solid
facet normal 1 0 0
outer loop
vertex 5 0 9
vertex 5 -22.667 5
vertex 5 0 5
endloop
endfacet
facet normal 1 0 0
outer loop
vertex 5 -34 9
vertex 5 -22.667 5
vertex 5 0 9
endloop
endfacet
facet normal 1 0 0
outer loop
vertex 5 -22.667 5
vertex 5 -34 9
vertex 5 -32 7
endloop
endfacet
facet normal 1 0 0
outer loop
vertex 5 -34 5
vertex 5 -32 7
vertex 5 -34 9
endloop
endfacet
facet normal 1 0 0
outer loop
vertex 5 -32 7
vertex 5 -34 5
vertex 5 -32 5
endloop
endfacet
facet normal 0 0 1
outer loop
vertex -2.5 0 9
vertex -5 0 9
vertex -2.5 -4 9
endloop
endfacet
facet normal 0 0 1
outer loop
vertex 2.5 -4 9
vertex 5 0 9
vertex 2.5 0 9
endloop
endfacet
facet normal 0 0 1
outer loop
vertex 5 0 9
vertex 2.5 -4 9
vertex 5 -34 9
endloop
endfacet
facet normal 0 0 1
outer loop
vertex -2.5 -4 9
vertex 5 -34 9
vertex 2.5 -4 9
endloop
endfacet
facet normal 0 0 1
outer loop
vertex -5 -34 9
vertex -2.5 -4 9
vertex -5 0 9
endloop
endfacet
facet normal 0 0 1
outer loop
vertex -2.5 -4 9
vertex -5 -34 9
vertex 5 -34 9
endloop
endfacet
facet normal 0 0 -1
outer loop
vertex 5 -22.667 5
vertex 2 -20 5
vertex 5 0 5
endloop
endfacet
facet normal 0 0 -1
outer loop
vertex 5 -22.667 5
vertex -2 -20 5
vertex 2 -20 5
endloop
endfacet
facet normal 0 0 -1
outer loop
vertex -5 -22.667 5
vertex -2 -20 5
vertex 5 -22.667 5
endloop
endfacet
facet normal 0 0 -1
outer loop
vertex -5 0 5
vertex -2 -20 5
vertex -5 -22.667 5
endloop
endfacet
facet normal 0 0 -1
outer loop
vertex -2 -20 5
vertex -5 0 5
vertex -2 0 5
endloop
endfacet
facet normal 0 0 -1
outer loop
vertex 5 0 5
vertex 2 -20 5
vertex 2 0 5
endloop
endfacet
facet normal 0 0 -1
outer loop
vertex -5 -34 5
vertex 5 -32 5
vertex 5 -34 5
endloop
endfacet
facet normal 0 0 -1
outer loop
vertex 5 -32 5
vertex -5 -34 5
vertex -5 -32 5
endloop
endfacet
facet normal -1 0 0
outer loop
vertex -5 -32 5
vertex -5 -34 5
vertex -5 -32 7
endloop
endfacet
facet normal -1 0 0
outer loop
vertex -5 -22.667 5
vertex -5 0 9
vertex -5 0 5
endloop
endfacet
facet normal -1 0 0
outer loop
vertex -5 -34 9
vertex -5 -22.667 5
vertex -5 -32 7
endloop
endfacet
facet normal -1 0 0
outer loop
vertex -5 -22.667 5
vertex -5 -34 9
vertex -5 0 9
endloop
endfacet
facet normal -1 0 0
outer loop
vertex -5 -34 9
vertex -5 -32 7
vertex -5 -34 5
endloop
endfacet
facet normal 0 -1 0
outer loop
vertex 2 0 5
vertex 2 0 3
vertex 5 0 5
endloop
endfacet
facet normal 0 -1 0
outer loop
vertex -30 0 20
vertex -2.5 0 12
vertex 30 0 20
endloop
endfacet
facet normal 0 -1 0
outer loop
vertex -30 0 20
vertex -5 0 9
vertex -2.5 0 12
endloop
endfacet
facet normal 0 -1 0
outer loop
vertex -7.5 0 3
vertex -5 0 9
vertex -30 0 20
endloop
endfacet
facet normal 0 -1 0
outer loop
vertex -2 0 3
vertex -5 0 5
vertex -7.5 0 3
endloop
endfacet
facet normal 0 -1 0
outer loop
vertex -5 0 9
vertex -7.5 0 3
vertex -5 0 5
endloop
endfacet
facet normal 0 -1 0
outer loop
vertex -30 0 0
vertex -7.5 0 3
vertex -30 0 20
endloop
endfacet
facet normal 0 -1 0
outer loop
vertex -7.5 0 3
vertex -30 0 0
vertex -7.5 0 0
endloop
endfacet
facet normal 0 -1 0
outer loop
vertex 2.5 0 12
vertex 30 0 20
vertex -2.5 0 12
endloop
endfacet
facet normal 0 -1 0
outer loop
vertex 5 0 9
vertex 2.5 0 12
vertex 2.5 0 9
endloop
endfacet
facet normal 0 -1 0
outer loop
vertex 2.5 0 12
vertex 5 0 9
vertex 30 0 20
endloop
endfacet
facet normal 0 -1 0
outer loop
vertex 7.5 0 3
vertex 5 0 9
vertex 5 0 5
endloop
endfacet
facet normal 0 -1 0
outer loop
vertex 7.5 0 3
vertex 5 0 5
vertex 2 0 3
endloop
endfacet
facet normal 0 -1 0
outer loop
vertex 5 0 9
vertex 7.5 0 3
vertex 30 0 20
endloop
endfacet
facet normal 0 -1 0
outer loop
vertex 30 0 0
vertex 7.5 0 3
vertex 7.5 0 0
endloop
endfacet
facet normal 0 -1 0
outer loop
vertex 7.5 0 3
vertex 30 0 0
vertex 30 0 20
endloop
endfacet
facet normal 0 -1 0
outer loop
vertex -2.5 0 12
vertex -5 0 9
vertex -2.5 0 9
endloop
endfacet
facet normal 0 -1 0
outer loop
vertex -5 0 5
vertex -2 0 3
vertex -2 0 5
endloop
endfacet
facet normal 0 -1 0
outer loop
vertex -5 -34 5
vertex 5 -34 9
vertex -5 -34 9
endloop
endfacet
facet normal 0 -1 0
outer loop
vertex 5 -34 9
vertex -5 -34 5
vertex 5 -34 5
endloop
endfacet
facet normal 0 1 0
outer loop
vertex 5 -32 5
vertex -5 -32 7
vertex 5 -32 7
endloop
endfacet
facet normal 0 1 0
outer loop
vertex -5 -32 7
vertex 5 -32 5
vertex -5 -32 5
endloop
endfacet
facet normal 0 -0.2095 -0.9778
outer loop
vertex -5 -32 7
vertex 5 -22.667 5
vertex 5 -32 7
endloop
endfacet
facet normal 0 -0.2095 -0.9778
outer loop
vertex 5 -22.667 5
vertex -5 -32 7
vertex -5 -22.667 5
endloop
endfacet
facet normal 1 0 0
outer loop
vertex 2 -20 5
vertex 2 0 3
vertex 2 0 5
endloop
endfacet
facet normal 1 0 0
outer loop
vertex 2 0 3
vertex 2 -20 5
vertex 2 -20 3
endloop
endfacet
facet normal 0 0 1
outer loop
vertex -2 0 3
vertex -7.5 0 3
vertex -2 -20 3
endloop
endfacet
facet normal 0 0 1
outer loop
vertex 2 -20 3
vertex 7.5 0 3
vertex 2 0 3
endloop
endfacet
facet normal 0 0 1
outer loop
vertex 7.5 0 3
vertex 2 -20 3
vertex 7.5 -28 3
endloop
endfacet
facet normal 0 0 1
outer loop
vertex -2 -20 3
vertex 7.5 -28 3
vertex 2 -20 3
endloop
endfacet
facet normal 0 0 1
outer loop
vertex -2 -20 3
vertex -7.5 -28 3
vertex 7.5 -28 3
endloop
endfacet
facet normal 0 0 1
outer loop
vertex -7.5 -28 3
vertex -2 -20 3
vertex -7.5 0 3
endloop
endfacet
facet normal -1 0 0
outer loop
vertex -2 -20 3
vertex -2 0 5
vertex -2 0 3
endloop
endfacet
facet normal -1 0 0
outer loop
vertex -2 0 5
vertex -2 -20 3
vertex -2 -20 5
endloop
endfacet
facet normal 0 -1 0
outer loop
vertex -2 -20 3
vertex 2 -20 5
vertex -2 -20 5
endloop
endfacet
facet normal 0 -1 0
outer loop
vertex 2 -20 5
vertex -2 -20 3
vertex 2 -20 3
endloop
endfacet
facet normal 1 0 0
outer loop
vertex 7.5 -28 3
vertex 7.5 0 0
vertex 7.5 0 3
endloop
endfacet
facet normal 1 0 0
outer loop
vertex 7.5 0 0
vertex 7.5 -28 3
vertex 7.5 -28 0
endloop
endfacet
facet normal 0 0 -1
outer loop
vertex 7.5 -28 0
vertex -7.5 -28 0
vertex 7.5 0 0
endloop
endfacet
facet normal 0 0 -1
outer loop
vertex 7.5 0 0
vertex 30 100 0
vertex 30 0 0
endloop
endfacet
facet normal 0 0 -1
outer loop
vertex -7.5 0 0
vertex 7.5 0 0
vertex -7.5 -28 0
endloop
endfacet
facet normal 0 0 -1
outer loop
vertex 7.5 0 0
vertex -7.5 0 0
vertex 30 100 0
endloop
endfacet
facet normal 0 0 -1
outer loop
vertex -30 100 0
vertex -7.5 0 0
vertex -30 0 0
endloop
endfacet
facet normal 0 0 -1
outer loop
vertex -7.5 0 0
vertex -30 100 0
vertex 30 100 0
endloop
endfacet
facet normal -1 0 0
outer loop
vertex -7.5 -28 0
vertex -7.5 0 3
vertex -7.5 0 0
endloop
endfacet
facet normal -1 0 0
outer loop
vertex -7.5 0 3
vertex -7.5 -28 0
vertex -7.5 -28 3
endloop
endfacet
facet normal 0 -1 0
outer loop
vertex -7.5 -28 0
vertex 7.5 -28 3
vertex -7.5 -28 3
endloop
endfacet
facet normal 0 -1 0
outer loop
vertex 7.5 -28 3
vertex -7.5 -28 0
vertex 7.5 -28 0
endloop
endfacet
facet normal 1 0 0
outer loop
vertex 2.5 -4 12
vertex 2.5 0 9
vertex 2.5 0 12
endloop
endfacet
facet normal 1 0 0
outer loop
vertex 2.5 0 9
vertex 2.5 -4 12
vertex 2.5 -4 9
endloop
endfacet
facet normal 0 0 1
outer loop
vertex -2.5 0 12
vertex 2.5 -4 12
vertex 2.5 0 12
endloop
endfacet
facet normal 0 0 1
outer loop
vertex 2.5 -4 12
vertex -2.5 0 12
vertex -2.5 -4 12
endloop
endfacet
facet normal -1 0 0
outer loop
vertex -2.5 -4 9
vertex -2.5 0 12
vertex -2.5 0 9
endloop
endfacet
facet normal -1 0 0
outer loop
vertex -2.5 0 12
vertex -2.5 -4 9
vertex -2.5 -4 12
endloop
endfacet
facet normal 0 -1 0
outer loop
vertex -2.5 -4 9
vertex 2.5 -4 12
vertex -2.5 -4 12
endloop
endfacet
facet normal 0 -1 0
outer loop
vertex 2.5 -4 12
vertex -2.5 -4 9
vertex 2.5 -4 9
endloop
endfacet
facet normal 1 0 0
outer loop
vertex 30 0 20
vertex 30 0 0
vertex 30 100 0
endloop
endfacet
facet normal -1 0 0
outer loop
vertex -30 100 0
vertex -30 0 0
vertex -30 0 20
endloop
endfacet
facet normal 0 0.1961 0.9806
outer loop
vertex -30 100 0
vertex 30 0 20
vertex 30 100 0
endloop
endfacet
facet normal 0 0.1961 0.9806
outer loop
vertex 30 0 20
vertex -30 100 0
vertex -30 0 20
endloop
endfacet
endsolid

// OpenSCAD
clip();

 translate([30, 100, 0]) rotate([90, 0, 270]) linear_extrude(60) polygon([[0,0],[100, 20], [100, 0]]);

module clip() {
    translate([-5, -34, 0]) {
        translate([0, 0, 5]) topClip();
        translate([3, 14, 3]) cube([4, 20, 2]);
        translate([-2.5, 6, 0]) cube([15, 28, 3]);
        translate([2.5, 30, 9]) cube([5, 4, 3]);
    }
}

module topClip() {
    difference() {
        cube([10,34,4]);
        translate([11, 15, 0]) rotate([90, 0, 270]) linear_extrude(12) polygon([[-1,-1],[13,2],[13,-1]]);
    }
}
